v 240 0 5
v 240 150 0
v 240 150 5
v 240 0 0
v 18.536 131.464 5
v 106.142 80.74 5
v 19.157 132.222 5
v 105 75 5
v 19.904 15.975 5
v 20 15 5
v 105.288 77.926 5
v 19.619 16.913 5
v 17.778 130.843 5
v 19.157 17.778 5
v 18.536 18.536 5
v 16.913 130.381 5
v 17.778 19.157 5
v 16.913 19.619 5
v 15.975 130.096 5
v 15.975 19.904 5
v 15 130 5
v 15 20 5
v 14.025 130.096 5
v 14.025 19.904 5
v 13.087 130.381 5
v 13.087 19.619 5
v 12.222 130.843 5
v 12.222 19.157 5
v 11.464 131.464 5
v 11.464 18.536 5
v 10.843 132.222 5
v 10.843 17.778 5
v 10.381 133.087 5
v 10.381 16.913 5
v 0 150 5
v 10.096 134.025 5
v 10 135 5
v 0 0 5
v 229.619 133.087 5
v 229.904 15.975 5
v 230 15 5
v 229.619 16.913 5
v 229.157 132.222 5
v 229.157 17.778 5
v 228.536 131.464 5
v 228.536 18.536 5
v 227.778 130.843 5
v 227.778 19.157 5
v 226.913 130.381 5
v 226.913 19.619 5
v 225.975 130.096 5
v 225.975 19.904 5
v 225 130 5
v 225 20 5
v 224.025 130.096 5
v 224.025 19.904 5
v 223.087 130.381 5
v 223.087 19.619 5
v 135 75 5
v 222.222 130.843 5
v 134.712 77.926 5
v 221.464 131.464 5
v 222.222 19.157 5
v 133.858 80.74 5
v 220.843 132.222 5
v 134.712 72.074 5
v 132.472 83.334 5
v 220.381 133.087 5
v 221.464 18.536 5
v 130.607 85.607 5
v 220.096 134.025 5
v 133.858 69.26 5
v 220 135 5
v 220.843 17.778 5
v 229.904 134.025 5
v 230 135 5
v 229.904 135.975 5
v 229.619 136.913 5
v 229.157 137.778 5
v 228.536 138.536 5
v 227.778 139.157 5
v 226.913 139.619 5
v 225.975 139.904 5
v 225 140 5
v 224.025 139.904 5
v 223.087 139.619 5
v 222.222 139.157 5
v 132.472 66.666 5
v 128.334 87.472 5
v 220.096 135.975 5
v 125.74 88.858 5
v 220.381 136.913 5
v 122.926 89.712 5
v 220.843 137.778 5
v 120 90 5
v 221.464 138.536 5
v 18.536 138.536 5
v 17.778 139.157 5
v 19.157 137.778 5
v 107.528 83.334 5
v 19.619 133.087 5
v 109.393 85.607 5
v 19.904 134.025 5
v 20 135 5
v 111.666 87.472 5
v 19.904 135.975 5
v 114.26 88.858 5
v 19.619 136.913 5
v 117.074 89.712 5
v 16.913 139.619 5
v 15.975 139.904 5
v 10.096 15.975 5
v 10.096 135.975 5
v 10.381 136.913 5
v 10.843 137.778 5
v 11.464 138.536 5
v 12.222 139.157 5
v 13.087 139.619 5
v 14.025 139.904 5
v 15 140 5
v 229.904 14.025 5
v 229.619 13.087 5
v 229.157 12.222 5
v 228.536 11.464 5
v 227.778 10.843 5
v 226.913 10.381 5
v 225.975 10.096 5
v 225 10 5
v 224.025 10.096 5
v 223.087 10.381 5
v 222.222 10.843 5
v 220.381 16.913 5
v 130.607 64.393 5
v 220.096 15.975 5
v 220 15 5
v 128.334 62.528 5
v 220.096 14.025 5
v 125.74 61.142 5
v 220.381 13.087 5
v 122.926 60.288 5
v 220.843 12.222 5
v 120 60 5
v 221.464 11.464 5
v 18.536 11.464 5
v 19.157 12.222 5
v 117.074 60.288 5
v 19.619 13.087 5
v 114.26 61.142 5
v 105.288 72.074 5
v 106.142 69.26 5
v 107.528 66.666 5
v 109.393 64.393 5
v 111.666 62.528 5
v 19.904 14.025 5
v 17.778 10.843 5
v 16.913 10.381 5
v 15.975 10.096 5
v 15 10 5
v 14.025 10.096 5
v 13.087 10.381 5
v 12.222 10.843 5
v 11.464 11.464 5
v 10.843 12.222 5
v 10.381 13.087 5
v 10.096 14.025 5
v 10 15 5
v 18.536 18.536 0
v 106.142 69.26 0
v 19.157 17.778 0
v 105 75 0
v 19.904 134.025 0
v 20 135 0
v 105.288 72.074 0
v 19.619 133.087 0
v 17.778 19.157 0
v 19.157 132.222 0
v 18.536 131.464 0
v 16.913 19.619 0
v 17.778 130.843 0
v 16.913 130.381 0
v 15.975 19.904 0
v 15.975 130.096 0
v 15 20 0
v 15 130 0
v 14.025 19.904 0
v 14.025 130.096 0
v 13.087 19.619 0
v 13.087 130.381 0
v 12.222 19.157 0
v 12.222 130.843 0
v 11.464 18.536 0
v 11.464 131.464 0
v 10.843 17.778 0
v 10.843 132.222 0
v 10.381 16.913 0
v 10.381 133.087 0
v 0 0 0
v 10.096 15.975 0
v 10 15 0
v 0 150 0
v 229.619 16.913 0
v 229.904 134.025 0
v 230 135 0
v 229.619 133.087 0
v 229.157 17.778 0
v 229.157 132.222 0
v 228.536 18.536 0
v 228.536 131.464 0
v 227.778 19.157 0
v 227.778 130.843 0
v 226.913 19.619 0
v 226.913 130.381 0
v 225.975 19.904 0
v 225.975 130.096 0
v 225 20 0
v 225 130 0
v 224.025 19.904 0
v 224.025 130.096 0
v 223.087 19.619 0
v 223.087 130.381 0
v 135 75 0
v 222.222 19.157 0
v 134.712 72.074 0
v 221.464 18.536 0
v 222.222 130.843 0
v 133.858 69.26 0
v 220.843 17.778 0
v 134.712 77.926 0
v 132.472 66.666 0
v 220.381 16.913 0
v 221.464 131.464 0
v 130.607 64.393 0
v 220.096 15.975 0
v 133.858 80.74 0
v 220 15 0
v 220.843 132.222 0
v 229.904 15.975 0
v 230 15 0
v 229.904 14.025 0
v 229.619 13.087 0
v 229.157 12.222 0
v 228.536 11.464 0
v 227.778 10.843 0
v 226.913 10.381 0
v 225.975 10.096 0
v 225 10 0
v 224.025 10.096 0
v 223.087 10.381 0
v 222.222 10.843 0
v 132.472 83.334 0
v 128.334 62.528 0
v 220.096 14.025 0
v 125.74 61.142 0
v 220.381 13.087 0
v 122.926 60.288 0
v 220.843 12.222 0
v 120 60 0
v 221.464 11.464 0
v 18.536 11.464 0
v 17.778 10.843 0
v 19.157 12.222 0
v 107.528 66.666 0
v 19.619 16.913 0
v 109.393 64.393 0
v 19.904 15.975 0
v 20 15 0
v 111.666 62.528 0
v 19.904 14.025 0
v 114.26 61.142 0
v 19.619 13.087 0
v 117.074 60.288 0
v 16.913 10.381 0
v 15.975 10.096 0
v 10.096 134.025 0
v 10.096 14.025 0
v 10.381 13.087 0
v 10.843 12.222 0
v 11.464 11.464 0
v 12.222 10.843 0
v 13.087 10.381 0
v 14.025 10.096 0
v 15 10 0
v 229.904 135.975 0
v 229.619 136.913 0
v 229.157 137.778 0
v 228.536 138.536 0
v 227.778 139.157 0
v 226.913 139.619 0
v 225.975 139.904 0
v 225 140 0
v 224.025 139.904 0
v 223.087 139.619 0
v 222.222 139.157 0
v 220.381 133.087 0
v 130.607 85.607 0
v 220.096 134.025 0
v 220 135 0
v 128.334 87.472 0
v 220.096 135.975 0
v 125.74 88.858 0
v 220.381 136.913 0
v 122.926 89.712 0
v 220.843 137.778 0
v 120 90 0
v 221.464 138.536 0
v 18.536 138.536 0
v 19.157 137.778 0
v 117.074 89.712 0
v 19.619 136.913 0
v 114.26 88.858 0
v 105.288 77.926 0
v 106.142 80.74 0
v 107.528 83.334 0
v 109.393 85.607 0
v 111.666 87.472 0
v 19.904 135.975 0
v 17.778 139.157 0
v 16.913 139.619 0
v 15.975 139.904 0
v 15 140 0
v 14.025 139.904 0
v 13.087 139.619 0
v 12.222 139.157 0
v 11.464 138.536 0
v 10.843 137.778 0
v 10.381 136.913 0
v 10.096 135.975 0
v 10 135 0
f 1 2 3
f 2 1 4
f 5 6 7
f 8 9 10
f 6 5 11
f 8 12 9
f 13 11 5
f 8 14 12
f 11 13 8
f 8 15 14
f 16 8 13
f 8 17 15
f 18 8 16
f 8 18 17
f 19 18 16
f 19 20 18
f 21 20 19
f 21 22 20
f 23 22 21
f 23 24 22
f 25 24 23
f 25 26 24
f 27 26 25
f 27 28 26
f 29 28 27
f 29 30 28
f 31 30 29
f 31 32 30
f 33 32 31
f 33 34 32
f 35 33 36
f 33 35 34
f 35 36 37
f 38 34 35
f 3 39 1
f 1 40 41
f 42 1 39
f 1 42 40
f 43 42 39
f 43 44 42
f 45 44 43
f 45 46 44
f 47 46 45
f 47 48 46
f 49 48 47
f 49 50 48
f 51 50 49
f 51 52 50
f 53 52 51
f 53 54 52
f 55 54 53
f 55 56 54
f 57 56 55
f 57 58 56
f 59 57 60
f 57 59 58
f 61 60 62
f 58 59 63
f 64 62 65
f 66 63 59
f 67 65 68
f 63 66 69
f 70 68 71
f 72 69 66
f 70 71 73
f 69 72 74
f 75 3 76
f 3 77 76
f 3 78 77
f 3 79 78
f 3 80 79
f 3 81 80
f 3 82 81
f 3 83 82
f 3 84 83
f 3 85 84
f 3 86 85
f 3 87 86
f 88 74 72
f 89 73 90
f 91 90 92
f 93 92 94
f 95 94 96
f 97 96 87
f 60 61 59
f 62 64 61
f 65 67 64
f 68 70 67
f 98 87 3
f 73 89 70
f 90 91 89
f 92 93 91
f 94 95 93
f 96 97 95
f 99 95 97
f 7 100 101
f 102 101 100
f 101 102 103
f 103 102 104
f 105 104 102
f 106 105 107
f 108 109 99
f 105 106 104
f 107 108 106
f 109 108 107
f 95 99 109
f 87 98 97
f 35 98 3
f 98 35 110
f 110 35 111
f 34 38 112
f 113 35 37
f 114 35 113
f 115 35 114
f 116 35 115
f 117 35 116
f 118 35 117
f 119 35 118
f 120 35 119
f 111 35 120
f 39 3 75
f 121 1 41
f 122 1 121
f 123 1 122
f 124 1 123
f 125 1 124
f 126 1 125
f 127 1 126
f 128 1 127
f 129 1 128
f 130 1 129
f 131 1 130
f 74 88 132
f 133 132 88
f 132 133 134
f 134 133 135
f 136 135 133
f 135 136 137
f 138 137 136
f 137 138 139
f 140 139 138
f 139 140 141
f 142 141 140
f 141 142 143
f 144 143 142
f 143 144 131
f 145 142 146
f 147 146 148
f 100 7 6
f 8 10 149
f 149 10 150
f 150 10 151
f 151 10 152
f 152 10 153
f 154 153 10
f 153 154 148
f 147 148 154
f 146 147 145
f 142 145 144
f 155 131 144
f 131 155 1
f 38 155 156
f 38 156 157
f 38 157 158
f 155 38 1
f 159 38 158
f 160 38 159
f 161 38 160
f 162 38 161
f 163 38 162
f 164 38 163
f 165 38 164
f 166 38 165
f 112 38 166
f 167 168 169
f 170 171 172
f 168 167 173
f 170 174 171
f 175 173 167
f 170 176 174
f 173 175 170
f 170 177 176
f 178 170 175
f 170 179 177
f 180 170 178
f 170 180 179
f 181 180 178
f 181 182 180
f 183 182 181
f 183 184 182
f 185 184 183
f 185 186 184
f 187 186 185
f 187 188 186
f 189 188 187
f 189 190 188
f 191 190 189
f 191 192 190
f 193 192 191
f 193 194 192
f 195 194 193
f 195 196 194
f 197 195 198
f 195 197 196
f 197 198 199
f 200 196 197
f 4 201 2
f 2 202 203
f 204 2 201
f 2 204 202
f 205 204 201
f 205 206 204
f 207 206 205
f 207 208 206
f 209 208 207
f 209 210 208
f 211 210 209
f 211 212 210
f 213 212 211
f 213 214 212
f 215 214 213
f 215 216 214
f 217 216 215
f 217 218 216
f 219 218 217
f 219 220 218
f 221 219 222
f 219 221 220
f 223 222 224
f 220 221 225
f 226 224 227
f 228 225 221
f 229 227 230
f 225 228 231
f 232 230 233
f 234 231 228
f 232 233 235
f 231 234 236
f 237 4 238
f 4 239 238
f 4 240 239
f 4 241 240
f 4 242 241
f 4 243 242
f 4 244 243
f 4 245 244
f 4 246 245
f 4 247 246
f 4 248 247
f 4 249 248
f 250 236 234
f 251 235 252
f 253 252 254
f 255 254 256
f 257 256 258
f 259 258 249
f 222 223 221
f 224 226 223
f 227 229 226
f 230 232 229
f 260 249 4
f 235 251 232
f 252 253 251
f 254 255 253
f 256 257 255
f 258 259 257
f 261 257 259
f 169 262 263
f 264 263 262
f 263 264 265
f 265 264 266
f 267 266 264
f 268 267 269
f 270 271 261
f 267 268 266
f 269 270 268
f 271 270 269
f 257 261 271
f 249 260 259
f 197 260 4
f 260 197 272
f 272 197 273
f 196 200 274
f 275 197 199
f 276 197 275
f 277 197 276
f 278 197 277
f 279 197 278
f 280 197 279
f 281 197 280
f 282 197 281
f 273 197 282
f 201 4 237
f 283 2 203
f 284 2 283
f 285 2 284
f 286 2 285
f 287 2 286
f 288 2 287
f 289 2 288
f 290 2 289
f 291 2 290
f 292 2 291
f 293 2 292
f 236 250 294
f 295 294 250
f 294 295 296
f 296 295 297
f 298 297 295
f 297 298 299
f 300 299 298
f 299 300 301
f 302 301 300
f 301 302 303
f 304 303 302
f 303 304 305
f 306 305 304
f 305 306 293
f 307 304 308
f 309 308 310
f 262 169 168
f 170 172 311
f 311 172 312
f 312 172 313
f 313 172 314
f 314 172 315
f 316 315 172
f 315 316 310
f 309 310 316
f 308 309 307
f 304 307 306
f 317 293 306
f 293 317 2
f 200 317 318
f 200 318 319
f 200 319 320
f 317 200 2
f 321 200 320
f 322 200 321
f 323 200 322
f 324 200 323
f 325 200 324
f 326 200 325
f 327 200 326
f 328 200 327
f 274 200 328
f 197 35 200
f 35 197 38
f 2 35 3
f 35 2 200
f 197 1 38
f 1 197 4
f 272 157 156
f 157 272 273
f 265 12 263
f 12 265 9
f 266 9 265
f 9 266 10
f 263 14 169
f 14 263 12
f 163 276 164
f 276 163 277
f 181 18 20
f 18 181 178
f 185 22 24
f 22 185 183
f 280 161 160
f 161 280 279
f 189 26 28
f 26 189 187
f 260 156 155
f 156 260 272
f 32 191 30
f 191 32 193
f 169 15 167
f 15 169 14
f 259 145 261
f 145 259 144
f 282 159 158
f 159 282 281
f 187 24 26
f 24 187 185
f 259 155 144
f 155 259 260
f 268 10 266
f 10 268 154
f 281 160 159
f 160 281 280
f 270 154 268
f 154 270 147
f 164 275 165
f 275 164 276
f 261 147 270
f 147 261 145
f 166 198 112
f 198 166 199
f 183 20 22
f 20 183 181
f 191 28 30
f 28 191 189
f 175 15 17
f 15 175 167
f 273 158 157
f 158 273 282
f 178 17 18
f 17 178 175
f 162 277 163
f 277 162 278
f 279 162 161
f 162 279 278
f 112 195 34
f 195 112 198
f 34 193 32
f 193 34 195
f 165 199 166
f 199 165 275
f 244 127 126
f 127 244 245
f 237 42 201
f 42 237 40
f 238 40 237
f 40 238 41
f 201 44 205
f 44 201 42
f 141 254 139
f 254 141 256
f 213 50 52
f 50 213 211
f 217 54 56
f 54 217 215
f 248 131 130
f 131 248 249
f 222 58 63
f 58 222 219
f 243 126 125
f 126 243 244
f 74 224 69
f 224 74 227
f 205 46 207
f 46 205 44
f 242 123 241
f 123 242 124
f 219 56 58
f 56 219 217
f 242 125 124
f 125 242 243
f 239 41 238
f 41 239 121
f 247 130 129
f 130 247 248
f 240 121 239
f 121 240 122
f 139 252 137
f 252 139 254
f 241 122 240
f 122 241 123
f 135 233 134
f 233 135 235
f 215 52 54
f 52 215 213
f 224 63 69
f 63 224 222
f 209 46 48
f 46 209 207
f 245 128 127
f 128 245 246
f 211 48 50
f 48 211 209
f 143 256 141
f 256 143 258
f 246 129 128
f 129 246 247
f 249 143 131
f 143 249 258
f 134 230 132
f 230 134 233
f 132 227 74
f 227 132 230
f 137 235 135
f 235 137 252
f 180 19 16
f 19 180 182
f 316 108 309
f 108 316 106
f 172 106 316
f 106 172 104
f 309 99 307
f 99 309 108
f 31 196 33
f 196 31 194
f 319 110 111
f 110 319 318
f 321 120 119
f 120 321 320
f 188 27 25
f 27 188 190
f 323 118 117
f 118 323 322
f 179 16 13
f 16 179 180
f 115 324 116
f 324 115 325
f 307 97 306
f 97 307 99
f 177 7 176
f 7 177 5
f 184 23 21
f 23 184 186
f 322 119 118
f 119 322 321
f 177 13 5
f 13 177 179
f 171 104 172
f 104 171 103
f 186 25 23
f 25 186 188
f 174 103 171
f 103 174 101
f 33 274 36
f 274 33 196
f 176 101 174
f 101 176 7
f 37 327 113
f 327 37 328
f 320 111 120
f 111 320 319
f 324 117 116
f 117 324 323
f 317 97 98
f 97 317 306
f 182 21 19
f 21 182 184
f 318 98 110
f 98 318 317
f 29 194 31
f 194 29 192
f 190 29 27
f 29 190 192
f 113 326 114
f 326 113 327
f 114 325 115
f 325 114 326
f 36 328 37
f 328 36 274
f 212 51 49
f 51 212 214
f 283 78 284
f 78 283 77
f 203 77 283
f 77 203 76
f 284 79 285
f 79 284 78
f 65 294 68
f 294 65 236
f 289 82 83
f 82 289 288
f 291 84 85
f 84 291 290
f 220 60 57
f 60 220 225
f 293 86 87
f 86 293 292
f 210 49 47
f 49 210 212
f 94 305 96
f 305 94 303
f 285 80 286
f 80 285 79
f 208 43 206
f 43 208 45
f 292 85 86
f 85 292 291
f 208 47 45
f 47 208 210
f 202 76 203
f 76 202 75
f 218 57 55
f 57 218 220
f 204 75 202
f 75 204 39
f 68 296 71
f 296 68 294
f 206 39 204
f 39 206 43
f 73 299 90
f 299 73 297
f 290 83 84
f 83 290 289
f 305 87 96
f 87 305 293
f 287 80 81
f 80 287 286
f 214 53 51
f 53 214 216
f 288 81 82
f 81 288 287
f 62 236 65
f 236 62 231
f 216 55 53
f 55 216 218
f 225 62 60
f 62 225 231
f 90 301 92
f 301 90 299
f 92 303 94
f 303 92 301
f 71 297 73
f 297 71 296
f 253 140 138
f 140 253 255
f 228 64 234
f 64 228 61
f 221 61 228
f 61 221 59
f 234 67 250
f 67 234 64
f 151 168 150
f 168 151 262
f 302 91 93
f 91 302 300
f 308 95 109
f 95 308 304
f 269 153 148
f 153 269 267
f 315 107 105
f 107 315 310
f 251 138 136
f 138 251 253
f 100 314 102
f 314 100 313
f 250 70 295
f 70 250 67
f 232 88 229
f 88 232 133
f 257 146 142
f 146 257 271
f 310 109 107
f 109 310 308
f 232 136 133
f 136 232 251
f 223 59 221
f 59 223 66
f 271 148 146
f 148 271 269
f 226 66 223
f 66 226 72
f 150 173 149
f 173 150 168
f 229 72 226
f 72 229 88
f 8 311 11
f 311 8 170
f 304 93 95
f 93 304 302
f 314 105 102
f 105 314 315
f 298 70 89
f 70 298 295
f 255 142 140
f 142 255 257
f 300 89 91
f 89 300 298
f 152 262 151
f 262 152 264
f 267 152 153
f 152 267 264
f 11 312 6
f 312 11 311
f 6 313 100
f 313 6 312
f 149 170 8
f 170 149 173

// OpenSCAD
$fn = 32;

// ----------------------------------------------------------------------
// Big plate: 200-250 mm adapter plate
// ----------------------------------------------------------------------

// --- parameters (mm) ---
plate_l = 240;            // plate length, X
plate_w = 150;            // plate width, Y
plate_t = 5;              // plate thickness, Z
corner_d = 10;            // corner hole diameter
corner_in = 15;           // corner hole inset from the edges
bore_d = 30;              // central bore

difference() {
  cube([plate_l, plate_w, plate_t]);
  translate([corner_in, corner_in, -1]) cylinder(h = plate_t + 2, d = corner_d);
  translate([plate_l - corner_in, corner_in, -1]) cylinder(h = plate_t + 2, d = corner_d);
  translate([corner_in, plate_w - corner_in, -1]) cylinder(h = plate_t + 2, d = corner_d);
  translate([plate_l - corner_in, plate_w - corner_in, -1]) cylinder(h = plate_t + 2, d = corner_d);
  translate([plate_l / 2, plate_w / 2, -1]) cylinder(h = plate_t + 2, d = bore_d);
}
